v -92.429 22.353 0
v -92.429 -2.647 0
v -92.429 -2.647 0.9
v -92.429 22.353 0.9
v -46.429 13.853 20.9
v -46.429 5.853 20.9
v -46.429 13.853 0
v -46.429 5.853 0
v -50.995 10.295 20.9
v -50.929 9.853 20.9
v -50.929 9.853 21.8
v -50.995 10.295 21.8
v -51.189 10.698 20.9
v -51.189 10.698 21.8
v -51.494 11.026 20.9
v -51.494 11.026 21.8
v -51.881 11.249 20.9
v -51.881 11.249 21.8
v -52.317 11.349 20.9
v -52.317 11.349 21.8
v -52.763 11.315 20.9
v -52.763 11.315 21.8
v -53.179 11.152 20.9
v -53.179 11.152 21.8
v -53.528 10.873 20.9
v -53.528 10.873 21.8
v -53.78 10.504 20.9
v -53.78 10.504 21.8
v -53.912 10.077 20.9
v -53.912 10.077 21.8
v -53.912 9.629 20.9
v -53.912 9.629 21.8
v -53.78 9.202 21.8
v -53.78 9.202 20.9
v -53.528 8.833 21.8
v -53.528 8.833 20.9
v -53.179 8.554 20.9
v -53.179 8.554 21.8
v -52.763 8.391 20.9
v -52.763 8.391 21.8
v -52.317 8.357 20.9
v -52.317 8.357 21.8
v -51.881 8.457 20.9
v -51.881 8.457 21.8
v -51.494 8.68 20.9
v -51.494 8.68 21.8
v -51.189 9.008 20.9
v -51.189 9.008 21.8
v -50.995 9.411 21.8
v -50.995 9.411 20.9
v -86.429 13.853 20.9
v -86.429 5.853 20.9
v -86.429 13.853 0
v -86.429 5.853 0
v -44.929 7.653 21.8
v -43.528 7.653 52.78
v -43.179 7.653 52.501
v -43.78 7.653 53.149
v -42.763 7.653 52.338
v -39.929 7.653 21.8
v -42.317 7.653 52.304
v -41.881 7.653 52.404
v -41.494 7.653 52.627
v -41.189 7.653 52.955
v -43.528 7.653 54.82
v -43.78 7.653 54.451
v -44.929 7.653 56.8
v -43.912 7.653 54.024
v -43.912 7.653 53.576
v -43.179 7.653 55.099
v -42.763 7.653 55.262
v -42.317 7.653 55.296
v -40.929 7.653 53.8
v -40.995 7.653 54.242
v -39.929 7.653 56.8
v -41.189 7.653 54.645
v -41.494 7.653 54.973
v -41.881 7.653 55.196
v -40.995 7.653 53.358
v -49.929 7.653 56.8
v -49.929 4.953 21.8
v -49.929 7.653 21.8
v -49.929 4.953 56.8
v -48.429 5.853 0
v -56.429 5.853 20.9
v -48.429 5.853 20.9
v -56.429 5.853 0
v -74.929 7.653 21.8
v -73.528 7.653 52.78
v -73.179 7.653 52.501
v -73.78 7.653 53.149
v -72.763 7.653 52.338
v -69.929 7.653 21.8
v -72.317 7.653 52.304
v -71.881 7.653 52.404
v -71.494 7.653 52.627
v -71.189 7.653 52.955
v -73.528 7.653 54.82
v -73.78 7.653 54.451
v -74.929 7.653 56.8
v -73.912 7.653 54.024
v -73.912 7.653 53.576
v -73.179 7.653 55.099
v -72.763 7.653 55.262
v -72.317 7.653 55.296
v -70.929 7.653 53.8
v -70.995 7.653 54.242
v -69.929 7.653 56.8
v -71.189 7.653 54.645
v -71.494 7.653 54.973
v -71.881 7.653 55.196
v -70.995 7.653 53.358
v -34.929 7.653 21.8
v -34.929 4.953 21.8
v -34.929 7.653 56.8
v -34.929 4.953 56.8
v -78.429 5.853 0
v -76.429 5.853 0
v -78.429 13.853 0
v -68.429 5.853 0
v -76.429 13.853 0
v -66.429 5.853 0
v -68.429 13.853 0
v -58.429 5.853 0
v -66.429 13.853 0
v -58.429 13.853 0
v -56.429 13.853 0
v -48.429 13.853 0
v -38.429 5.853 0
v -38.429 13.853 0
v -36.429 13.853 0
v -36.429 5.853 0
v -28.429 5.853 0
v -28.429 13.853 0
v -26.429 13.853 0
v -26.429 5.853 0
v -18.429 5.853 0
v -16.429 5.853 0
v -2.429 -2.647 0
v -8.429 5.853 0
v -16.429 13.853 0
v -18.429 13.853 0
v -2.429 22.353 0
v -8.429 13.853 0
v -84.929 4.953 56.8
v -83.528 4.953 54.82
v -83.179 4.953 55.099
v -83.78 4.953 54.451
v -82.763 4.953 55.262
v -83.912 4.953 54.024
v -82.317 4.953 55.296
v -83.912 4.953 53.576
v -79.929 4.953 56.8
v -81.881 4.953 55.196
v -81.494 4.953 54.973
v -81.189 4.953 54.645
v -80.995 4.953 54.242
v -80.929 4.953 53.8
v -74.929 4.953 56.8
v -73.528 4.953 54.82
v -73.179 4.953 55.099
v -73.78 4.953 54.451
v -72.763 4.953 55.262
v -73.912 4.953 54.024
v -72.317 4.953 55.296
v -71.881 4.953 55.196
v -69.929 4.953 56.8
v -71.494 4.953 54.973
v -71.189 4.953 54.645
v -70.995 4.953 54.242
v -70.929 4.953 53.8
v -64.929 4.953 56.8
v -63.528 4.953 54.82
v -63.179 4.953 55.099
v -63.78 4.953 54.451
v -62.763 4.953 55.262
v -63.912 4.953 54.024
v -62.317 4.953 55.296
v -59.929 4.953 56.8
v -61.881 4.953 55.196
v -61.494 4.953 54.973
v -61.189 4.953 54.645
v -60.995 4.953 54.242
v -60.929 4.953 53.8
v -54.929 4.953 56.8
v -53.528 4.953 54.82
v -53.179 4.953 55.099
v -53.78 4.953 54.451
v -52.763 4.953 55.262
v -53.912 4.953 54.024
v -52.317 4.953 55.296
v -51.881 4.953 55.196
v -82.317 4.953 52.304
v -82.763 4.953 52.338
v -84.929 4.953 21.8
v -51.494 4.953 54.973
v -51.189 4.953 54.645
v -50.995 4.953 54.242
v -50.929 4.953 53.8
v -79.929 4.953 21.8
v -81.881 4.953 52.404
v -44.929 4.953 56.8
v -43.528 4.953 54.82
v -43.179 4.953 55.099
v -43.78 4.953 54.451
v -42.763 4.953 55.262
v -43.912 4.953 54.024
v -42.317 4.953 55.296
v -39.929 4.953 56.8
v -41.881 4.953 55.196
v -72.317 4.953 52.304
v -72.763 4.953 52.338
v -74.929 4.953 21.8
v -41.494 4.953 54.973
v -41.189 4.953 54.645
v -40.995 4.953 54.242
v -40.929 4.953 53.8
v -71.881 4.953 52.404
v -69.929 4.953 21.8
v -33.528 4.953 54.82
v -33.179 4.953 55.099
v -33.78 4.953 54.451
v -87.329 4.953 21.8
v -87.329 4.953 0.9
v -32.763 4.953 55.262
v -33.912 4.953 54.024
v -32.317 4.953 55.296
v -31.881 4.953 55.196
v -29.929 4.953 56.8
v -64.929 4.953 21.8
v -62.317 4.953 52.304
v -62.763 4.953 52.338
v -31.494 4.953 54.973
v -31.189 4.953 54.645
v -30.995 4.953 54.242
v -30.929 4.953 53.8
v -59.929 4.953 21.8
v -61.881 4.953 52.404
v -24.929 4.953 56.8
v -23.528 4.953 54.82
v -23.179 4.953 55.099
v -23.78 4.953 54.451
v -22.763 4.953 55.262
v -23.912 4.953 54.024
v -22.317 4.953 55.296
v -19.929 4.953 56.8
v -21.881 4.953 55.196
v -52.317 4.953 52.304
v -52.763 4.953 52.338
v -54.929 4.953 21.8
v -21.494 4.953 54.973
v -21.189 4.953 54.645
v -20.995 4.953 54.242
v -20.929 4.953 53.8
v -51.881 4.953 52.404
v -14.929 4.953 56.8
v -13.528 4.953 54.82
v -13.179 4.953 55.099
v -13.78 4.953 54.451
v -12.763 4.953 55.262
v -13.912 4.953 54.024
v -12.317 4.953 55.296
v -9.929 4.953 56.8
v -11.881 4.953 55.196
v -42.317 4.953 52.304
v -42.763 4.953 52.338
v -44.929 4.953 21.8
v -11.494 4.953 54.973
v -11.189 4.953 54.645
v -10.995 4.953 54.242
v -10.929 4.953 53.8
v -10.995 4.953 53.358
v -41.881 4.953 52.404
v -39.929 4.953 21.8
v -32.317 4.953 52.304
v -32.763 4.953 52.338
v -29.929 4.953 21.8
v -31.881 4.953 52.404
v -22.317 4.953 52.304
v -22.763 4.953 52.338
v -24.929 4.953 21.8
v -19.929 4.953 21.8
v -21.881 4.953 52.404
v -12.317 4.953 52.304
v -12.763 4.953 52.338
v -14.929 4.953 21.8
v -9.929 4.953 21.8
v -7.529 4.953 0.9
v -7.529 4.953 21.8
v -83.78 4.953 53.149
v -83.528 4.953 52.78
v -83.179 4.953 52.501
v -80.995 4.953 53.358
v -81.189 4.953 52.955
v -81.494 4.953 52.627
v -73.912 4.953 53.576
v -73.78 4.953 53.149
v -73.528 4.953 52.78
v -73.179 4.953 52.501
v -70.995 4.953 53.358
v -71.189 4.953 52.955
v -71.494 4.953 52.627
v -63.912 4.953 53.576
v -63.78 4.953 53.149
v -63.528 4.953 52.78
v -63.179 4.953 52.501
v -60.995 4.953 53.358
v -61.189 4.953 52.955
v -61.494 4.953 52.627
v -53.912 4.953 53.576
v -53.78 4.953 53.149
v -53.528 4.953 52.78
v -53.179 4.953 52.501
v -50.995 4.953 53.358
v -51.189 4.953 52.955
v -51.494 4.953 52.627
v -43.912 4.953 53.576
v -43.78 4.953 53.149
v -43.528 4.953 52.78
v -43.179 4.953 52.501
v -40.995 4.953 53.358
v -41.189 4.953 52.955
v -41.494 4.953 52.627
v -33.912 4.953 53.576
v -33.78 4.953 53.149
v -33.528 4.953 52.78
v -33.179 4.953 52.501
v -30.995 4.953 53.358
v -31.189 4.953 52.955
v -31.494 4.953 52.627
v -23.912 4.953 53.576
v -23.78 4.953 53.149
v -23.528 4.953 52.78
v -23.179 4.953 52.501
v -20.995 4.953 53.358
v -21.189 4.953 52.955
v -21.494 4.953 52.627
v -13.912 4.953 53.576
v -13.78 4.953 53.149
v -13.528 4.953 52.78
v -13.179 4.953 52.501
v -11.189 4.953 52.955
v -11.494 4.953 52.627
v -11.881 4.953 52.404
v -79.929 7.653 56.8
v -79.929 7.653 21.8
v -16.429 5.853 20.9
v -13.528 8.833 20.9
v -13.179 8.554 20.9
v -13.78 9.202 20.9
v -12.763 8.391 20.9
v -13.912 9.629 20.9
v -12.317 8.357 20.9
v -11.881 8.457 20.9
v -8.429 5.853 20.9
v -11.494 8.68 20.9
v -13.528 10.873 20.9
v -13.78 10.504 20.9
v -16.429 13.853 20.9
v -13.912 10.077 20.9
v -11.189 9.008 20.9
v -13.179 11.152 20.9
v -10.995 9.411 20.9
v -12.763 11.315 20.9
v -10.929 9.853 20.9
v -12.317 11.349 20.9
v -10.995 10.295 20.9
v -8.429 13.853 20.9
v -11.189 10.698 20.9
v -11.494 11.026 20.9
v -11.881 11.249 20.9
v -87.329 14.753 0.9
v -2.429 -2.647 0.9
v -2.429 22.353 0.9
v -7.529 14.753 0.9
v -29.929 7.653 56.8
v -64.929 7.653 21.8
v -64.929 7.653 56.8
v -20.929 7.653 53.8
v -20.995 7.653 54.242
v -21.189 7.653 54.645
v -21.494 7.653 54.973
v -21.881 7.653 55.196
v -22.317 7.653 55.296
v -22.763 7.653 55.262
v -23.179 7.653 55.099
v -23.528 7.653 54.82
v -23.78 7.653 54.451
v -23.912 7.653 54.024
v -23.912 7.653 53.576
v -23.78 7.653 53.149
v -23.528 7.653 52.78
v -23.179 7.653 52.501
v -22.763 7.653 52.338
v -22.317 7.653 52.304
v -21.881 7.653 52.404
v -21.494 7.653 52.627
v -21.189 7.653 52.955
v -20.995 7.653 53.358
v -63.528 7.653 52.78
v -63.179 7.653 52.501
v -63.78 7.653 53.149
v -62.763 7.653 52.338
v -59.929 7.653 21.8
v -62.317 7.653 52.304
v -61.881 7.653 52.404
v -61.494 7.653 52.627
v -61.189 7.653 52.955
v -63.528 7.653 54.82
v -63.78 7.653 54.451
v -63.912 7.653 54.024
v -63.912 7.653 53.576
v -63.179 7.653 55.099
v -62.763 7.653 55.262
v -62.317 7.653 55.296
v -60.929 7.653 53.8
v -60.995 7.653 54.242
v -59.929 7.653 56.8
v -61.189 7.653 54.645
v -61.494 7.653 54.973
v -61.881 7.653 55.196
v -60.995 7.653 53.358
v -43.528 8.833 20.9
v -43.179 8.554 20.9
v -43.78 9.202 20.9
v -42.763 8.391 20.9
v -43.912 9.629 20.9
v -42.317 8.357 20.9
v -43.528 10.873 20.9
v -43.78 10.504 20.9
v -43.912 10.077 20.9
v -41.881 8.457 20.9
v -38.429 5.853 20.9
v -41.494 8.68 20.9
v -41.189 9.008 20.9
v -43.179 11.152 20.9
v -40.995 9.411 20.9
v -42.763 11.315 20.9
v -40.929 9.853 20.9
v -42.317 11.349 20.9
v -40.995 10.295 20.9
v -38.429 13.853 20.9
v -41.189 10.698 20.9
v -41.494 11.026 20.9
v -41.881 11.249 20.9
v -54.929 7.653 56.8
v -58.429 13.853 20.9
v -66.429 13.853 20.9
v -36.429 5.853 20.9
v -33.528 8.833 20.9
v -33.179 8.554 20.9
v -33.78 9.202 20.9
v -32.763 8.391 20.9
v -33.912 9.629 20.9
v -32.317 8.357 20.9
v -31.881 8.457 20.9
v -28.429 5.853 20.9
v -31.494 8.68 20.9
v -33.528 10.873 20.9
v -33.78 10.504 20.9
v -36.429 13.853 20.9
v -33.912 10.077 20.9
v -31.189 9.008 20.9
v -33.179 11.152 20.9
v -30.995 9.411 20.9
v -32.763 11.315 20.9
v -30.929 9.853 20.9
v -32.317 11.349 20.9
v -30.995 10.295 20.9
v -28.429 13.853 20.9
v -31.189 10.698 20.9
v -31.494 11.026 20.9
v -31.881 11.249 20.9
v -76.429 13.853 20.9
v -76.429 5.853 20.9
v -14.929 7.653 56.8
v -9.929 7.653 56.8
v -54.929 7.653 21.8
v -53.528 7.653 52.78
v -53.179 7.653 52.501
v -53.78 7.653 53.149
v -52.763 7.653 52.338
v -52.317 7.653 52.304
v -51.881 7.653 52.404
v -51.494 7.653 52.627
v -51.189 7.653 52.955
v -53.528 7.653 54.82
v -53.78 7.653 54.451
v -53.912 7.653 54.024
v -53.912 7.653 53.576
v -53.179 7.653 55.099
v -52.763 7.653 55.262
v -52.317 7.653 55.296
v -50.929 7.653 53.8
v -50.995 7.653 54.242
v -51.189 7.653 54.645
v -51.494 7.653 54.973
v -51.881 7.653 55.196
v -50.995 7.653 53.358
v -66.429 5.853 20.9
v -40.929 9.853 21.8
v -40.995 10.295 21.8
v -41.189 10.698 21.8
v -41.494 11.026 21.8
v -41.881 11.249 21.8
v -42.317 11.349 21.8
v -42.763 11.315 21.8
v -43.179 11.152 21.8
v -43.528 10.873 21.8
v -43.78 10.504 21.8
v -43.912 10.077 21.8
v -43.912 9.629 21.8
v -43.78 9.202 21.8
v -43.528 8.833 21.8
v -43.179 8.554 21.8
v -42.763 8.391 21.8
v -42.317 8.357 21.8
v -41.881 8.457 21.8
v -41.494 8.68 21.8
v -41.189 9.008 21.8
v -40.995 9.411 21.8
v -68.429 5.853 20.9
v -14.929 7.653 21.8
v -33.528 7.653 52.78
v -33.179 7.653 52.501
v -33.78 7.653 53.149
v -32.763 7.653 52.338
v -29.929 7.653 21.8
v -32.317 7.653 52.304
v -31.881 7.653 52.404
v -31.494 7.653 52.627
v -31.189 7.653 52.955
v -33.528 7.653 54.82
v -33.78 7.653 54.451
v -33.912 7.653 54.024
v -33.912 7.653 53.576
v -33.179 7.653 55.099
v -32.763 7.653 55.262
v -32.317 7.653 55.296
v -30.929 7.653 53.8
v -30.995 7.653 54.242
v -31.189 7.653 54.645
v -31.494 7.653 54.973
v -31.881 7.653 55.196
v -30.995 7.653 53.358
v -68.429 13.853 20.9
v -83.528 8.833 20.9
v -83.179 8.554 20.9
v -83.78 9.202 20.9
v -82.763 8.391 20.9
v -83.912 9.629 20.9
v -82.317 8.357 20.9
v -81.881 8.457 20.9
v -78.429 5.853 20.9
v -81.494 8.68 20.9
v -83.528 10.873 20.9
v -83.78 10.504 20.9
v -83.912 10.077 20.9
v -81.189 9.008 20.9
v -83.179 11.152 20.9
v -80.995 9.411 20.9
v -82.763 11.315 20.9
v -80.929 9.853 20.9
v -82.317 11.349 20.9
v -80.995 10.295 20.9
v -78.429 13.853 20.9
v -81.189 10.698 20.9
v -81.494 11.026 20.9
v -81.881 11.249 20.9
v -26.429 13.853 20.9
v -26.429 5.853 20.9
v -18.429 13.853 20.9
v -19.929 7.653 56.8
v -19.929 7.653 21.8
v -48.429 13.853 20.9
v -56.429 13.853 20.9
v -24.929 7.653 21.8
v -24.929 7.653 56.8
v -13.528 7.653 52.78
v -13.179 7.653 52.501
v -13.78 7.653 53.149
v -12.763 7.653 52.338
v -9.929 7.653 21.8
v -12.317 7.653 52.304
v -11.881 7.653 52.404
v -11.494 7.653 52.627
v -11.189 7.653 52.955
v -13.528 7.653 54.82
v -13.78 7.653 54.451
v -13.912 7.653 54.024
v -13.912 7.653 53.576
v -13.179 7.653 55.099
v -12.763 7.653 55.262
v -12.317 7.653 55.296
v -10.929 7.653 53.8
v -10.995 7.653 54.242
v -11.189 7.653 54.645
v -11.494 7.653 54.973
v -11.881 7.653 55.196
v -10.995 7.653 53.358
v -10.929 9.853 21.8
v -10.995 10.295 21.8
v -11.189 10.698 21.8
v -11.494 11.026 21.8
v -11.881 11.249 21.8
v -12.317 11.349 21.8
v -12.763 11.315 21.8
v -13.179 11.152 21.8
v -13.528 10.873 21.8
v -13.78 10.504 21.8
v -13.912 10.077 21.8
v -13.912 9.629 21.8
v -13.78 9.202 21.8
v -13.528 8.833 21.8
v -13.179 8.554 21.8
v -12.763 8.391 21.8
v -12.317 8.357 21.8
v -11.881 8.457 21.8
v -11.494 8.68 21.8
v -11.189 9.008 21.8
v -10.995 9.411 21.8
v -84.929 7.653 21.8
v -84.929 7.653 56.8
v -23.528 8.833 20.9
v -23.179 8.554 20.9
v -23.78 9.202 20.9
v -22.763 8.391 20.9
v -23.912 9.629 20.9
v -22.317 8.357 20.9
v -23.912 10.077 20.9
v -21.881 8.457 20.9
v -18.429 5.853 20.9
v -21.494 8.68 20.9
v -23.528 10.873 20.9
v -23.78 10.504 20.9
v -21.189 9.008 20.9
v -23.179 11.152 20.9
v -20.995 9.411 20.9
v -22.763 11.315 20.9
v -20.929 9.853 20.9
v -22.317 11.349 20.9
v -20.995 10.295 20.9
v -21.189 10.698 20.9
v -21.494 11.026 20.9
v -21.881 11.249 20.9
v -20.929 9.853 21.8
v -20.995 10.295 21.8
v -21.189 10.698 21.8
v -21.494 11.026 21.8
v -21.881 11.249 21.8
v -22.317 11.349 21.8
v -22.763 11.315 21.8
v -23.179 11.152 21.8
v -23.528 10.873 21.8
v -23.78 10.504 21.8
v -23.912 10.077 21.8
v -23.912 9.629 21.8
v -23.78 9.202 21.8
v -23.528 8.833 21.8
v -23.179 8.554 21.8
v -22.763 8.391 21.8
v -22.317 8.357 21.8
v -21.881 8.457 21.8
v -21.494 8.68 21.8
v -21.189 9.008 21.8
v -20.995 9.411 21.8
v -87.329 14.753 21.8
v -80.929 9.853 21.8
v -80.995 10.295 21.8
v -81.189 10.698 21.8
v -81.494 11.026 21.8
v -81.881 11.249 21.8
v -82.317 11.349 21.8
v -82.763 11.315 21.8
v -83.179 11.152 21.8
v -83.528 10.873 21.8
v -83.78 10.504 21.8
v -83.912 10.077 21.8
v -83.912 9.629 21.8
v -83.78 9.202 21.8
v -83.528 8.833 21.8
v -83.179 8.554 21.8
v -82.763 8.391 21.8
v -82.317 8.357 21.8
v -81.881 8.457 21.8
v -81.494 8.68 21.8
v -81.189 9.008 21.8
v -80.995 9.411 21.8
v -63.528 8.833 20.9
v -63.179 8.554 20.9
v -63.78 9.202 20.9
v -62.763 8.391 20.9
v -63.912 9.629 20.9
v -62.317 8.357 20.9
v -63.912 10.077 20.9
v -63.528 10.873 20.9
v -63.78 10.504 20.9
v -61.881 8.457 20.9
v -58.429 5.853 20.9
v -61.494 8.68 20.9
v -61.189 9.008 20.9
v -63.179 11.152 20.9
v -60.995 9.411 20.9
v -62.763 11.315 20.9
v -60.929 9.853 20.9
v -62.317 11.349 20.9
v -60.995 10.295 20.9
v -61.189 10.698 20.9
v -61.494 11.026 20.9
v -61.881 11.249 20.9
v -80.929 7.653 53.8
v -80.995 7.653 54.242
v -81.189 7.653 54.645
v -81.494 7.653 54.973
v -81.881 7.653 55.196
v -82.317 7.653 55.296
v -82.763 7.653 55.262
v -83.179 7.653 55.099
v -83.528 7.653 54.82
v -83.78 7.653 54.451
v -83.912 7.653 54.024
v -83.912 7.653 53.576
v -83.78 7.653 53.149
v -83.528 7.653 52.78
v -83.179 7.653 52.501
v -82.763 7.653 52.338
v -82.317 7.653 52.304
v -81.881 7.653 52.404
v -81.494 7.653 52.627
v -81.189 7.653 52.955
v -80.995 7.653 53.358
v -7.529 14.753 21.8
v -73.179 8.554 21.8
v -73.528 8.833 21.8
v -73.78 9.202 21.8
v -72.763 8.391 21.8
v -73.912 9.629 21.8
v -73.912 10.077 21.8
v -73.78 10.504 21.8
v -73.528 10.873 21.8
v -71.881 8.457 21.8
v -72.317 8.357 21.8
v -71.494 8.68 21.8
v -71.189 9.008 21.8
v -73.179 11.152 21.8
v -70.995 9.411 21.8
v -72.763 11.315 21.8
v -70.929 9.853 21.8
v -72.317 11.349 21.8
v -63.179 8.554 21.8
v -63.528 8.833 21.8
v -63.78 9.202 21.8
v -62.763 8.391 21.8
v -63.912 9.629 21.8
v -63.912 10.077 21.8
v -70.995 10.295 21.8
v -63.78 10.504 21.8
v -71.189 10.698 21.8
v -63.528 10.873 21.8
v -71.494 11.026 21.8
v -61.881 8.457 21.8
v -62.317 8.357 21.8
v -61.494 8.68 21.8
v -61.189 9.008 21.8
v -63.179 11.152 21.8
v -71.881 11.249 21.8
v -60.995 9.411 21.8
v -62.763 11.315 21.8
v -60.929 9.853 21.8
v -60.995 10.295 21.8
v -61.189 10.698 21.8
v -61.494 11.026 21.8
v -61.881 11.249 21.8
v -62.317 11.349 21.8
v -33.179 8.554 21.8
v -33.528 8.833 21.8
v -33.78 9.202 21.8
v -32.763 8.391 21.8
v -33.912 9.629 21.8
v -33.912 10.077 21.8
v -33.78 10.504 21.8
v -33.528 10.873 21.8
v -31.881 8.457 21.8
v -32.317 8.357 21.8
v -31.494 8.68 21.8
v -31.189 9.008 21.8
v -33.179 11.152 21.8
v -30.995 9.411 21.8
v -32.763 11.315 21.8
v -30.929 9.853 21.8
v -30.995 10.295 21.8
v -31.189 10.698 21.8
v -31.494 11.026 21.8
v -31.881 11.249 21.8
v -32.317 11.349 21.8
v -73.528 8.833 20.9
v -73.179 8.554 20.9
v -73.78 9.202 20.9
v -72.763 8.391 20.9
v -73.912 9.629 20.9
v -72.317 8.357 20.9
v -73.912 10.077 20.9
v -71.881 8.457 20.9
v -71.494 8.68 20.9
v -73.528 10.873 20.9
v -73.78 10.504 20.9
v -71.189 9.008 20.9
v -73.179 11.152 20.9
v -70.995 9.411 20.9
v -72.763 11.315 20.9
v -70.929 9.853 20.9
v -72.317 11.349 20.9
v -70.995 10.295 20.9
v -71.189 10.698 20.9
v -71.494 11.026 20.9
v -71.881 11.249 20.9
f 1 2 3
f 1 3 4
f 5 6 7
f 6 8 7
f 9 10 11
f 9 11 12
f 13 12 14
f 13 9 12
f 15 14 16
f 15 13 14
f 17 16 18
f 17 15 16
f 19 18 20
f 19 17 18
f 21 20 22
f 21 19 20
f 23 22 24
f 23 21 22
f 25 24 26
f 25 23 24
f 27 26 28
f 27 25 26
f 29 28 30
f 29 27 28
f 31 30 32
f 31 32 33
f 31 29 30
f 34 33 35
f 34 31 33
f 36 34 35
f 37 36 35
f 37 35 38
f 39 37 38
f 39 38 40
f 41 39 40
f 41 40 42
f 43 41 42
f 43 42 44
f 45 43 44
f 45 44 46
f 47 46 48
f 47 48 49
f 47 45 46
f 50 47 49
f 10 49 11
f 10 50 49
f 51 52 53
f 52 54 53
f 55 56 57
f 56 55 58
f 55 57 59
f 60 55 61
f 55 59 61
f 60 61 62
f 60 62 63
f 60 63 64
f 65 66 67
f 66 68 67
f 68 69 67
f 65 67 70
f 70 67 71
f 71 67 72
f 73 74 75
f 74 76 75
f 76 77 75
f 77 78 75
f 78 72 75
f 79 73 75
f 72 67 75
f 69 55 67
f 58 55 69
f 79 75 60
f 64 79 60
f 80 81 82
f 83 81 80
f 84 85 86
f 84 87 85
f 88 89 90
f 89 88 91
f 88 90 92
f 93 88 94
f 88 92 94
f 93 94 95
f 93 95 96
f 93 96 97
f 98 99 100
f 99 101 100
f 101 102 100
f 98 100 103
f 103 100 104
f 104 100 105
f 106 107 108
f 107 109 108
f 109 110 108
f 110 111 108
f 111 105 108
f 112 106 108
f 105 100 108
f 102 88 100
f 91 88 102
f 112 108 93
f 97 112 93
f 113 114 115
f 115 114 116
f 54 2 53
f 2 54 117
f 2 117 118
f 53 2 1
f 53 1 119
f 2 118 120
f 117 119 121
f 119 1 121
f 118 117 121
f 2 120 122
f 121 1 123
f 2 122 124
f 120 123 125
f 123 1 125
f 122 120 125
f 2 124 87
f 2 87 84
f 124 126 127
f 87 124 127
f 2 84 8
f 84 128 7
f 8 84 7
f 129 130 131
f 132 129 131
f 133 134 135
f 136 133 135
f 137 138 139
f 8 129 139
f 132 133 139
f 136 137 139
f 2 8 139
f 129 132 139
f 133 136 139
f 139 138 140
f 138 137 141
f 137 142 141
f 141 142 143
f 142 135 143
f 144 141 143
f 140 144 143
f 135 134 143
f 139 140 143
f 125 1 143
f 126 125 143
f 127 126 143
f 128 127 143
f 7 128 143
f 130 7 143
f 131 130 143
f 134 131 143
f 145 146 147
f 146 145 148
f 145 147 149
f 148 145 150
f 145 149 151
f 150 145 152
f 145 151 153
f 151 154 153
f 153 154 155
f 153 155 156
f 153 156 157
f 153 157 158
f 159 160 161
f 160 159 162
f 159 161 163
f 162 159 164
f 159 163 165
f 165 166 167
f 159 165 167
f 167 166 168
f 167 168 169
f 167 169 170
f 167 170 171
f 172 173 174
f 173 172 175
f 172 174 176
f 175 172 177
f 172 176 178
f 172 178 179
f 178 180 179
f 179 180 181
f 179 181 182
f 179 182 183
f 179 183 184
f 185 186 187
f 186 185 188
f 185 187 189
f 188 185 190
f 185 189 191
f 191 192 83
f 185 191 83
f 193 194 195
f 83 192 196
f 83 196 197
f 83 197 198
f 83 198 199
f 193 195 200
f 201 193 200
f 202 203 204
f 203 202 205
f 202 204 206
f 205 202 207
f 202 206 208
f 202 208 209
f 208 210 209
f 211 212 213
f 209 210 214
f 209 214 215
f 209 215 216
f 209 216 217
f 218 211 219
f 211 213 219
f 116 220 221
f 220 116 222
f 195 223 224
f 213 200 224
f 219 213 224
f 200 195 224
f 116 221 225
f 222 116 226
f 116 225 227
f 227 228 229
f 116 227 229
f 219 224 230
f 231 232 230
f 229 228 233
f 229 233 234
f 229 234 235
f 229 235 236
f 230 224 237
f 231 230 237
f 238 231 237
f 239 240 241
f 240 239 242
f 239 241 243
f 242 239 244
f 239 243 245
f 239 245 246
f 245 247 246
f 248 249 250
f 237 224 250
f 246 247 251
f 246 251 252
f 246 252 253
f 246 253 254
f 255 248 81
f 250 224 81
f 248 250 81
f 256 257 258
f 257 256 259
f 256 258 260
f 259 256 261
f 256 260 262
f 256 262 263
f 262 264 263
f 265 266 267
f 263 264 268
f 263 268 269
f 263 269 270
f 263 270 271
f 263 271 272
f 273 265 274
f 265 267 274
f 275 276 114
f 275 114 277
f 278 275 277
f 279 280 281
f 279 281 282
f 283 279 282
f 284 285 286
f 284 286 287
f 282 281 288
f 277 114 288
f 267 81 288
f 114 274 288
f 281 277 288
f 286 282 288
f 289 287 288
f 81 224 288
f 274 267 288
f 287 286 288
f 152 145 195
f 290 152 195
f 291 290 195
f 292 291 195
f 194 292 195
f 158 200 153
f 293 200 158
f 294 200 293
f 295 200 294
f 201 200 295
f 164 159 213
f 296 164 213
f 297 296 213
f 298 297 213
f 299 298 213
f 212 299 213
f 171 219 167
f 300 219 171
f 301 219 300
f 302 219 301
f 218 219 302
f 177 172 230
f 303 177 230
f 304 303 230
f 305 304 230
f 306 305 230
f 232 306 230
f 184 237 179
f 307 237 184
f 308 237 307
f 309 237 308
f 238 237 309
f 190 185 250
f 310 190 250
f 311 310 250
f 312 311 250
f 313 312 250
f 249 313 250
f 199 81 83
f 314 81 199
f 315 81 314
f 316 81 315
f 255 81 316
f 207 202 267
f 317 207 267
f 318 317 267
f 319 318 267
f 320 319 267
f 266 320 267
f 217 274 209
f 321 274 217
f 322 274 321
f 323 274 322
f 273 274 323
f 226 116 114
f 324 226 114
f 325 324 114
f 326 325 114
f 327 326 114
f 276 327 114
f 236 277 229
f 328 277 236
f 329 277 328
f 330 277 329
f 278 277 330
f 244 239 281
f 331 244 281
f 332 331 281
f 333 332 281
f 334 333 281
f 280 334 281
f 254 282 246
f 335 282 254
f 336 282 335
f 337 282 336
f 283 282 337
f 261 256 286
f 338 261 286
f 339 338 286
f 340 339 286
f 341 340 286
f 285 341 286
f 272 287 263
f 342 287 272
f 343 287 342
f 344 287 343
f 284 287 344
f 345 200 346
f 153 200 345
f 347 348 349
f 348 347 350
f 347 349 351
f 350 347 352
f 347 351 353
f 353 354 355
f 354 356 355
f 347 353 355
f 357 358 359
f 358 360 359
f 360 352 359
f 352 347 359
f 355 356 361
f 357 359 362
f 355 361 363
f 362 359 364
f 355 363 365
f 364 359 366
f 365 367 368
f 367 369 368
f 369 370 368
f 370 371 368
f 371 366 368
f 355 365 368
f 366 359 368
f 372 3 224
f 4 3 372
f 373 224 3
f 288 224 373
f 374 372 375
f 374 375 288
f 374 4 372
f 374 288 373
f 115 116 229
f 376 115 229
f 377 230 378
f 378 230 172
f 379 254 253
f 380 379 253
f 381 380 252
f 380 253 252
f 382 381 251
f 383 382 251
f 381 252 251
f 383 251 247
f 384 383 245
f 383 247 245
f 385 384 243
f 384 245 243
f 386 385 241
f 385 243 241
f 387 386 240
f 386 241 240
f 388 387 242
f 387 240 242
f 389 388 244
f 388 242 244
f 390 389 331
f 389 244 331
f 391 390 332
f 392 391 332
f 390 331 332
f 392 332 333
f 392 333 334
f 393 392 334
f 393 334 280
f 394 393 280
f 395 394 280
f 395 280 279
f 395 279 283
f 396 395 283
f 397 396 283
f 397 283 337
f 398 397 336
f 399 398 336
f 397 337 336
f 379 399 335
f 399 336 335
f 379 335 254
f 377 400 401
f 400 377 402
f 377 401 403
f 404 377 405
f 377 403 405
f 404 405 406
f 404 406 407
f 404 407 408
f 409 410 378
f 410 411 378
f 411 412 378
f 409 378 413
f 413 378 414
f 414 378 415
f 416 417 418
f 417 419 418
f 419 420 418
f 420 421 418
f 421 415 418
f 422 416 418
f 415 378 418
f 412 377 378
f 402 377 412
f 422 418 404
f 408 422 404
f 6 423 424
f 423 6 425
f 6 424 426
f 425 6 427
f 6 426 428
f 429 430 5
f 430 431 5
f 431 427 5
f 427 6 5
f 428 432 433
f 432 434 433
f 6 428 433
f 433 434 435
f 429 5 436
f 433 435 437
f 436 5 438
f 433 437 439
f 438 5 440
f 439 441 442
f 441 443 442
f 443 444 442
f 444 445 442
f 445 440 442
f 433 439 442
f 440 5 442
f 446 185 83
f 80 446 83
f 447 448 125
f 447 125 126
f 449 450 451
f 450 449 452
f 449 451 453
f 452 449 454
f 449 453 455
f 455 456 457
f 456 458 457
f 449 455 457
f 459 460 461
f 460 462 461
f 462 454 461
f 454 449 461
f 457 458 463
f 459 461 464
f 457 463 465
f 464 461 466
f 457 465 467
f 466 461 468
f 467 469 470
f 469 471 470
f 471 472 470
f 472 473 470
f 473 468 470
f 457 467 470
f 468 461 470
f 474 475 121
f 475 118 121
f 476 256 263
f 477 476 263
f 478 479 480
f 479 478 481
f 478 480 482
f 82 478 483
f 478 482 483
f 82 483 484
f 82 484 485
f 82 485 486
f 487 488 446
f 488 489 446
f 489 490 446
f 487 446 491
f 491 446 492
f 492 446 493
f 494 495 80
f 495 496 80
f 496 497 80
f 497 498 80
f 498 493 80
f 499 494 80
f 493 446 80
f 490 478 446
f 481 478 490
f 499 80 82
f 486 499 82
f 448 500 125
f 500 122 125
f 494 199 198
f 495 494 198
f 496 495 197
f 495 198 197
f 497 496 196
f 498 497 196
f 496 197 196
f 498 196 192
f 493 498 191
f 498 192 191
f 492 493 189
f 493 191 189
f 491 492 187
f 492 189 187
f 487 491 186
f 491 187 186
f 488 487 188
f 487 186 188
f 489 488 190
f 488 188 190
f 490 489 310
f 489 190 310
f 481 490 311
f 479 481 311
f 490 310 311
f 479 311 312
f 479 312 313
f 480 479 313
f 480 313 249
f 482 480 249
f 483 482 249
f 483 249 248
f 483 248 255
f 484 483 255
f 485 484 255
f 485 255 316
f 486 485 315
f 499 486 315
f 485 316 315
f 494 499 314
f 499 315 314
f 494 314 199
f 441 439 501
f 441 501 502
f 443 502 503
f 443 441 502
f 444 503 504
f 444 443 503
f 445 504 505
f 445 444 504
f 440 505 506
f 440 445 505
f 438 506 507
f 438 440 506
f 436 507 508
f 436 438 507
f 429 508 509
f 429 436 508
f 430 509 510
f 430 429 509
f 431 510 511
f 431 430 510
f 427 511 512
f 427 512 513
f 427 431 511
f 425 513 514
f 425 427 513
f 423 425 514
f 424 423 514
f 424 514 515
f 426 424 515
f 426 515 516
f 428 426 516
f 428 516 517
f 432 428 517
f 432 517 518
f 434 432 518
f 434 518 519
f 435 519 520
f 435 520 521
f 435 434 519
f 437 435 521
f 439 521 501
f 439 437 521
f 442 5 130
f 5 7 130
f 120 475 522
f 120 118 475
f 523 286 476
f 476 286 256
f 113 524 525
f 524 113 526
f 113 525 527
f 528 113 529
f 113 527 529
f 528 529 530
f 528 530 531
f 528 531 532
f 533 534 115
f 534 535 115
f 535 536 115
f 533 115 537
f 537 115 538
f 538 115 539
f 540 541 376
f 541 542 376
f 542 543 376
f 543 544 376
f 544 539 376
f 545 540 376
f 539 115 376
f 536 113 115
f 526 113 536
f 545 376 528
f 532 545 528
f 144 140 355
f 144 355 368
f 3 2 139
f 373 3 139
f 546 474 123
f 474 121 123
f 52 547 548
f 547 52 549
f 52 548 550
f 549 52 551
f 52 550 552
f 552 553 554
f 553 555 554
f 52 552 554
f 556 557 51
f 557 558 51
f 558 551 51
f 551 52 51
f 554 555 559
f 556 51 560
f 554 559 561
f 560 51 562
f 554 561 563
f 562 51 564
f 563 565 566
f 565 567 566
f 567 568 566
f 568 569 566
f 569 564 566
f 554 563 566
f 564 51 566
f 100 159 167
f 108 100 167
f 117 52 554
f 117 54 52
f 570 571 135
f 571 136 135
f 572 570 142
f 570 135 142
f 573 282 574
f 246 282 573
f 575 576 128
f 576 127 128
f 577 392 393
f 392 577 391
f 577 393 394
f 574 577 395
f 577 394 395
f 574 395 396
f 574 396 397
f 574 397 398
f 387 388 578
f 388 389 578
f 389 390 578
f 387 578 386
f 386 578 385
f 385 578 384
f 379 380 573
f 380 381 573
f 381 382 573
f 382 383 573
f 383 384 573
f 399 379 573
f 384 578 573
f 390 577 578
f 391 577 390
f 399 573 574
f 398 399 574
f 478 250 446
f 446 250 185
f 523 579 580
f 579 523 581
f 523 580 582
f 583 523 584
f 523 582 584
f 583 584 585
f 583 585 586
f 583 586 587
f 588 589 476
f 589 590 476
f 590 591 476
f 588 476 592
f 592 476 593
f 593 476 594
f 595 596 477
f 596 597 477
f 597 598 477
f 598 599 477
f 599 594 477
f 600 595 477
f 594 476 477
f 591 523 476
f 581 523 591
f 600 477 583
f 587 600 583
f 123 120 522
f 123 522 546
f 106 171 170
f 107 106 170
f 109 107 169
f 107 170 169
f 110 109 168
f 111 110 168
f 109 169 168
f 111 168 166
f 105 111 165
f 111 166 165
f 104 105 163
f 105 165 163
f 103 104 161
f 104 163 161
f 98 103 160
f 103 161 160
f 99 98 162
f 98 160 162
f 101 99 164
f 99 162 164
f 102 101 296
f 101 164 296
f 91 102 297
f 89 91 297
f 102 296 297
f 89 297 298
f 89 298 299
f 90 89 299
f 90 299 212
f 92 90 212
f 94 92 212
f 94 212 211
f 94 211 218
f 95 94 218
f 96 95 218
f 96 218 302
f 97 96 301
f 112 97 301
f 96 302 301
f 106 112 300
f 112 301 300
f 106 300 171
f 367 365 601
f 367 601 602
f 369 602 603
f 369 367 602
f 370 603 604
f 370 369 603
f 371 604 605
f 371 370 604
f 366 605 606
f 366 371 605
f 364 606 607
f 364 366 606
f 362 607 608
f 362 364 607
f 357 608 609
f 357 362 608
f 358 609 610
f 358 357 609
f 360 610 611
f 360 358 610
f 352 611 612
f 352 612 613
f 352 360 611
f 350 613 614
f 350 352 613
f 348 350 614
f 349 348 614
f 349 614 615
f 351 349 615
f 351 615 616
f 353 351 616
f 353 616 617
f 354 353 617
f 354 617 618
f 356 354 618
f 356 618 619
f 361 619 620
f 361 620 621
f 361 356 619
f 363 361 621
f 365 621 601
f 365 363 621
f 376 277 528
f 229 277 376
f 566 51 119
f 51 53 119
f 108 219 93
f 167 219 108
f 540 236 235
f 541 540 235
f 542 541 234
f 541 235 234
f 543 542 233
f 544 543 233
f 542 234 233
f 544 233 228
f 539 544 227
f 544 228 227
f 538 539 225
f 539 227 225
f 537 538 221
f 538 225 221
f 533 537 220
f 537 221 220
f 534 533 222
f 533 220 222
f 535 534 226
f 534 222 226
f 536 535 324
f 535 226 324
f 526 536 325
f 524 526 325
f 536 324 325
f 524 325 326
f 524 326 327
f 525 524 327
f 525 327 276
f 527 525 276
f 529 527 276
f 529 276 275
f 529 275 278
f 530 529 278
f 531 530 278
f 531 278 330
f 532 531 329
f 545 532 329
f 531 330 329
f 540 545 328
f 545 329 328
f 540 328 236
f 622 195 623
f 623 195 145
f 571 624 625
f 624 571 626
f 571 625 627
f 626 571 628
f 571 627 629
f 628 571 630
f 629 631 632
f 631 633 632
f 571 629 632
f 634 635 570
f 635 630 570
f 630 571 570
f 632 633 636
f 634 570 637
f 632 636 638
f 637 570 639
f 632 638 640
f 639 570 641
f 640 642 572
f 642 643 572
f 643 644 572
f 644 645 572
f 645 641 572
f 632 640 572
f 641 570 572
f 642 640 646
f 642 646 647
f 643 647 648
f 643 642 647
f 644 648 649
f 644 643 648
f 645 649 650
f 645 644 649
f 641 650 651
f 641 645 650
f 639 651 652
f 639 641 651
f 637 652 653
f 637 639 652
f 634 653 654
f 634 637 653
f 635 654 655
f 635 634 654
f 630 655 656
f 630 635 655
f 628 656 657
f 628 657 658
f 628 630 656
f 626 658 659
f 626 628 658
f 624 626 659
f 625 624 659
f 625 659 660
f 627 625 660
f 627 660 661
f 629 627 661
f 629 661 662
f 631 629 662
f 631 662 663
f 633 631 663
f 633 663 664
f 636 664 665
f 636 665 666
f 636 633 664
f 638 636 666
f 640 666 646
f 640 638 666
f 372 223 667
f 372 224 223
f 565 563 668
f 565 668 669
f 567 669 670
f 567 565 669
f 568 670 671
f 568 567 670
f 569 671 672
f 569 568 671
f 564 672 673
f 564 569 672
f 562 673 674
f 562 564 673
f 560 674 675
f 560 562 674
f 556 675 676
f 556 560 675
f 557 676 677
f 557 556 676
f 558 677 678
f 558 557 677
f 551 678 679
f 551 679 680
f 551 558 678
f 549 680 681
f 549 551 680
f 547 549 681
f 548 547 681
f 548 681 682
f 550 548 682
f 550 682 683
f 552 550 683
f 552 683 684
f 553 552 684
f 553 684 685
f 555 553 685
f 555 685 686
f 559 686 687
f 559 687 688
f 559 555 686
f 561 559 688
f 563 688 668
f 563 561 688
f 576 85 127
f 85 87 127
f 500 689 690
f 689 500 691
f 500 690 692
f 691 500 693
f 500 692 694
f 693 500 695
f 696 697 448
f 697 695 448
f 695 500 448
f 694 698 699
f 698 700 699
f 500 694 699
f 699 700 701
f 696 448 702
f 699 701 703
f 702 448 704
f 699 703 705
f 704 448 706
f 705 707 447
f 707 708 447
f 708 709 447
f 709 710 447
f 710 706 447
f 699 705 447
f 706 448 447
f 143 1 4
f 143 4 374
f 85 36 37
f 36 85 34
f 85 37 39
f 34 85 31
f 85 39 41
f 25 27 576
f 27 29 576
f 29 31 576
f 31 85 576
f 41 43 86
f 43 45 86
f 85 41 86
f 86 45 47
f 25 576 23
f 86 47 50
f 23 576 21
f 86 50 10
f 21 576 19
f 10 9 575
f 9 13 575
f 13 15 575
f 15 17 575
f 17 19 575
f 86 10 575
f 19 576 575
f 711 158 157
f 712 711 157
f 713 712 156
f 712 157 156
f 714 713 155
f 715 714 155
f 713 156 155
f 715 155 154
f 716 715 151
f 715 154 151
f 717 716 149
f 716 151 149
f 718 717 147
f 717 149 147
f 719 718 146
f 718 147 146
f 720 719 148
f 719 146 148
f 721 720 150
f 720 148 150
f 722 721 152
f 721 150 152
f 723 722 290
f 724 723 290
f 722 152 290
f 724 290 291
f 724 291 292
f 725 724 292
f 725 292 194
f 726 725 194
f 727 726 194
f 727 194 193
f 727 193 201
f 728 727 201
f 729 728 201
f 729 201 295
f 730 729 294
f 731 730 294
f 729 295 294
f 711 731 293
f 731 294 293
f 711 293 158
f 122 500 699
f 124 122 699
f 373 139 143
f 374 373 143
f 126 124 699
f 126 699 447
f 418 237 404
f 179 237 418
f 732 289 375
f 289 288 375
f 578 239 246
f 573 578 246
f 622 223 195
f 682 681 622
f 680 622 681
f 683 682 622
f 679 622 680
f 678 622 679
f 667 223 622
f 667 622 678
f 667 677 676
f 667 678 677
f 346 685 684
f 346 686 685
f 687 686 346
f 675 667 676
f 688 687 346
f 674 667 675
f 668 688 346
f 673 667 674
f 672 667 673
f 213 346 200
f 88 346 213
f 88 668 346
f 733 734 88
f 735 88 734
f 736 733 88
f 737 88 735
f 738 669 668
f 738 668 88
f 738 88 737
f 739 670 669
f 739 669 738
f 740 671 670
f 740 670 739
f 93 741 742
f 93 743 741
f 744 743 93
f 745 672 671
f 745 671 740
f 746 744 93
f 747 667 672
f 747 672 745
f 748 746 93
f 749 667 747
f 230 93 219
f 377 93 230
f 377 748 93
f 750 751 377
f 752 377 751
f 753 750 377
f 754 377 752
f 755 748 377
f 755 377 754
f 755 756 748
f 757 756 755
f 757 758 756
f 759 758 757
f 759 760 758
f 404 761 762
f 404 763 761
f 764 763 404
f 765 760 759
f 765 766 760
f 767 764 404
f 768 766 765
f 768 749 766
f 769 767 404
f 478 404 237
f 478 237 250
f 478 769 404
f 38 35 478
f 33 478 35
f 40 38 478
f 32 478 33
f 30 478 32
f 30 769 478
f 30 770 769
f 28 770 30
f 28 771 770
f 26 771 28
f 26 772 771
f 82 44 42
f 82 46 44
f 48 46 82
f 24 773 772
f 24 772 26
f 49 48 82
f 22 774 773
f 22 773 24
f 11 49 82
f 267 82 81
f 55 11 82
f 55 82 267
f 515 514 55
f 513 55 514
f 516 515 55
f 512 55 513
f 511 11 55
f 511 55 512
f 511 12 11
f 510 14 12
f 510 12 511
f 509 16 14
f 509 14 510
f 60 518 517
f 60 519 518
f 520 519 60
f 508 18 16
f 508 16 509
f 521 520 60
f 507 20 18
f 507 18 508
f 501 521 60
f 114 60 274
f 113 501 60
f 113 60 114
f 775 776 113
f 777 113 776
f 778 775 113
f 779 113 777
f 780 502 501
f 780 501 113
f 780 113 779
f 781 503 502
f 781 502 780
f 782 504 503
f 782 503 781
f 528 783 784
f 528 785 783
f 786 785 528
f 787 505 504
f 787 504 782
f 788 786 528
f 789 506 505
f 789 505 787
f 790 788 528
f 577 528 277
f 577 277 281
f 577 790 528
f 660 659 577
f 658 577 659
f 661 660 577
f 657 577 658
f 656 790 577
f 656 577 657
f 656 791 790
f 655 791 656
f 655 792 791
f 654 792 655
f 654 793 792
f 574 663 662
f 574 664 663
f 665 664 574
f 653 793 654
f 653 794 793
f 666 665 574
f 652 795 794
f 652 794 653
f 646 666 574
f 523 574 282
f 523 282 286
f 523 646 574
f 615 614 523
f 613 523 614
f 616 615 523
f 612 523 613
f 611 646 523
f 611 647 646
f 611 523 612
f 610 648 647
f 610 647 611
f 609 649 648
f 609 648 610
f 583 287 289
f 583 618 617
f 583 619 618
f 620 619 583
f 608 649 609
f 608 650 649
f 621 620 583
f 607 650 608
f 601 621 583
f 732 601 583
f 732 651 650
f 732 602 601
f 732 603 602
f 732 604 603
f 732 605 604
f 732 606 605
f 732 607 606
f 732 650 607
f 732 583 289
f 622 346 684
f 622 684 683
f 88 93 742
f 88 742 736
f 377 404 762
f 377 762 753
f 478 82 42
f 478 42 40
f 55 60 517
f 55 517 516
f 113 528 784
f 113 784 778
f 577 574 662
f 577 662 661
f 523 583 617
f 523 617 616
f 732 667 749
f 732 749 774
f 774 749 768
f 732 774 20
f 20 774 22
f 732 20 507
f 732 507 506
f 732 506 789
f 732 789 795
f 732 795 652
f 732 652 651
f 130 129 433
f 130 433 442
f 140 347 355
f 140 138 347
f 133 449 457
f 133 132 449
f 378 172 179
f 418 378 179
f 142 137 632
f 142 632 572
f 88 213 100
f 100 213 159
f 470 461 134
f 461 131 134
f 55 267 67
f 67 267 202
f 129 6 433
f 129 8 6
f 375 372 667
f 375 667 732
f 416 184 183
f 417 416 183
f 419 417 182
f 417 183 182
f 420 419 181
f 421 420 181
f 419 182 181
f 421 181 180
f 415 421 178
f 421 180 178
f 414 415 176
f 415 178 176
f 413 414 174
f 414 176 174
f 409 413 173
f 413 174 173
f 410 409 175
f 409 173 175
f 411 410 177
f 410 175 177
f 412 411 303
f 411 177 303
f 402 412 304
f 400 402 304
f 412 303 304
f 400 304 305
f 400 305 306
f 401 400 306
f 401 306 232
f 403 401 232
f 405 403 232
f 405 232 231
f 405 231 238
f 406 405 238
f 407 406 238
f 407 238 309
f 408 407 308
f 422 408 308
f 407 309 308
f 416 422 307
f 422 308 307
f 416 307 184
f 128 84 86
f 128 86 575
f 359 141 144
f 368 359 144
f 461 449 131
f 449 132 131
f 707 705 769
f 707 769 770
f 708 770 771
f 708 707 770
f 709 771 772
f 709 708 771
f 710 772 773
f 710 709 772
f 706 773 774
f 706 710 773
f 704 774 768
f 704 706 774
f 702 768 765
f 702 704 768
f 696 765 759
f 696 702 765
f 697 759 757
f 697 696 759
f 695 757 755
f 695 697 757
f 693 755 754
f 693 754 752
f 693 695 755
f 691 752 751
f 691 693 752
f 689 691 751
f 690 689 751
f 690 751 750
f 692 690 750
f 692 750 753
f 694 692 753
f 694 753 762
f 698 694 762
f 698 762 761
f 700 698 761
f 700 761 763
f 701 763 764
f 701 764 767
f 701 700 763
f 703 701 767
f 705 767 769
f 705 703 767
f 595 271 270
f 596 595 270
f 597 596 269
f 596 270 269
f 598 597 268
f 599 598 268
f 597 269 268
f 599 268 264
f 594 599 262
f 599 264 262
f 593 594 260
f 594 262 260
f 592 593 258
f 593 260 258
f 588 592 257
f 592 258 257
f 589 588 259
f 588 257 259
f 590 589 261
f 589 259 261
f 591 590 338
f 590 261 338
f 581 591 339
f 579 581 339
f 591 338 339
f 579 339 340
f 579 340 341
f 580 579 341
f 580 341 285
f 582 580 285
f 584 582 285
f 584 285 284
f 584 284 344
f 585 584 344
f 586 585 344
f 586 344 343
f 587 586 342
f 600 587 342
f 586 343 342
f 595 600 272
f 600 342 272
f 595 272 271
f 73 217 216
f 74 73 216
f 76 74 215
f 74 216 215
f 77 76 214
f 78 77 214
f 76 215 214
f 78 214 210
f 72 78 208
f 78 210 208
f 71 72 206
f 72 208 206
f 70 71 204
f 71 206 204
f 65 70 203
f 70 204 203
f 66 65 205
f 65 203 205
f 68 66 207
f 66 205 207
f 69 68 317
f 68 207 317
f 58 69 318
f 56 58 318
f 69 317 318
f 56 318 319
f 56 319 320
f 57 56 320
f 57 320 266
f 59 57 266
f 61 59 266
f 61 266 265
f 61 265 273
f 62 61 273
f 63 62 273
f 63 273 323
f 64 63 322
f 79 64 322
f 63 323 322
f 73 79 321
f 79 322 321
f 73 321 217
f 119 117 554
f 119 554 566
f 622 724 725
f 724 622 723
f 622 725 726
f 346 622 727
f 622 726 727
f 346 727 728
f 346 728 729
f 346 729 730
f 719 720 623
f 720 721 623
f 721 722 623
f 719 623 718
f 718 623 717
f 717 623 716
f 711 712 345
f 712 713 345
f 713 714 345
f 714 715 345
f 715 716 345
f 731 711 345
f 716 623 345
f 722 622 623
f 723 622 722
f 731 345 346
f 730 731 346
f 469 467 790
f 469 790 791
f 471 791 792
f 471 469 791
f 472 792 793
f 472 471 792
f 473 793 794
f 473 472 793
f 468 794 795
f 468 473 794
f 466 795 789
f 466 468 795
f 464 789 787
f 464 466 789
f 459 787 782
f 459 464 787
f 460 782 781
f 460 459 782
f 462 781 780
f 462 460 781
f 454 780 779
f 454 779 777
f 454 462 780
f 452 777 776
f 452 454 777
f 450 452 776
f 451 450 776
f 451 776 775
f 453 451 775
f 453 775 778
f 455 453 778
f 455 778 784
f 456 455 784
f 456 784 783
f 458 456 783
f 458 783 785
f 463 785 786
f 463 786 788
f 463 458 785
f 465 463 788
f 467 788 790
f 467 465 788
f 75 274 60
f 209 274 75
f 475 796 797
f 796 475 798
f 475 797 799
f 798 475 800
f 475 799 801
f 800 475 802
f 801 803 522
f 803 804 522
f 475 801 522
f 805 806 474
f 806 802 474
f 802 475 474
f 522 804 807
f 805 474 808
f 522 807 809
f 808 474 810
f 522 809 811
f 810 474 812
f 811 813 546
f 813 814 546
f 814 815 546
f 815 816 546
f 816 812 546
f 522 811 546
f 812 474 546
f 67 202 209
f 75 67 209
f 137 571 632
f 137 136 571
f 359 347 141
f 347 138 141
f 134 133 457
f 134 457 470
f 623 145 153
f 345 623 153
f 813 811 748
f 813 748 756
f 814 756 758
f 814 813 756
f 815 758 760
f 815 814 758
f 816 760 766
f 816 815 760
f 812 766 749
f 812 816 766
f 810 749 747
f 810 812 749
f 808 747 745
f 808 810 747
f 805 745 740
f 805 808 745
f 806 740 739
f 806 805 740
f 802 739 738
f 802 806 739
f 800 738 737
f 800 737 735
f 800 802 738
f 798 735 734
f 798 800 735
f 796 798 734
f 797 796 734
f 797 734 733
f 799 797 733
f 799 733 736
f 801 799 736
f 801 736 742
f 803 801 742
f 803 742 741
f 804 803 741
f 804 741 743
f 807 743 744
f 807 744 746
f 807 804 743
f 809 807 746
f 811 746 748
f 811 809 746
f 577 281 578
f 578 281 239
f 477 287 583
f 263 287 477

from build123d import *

# Parameters (mm, degrees)
CROQUIS1_W              = 90
CROQUIS1_H              = 25
SALIENTE_EXTRUIR1_DEPTH = 0.9
CROQUIS2_W              = 8
CROQUIS2_H              = 8
CORTAR_EXTRUIR1_DEPTH   = 0.9
CROQUIS3_W              = 79.8
CROQUIS3_H              = 9.8
CROQUIS3_W_2            = 8
CROQUIS3_H_2            = 8
SALIENTE_EXTRUIR2_DEPTH = 20
CROQUIS4_W              = 79.8
CROQUIS4_H              = 9.8
CROQUIS4_R              = 1.5
SALIENTE_EXTRUIR3_DEPTH = 0.9
CROQUIS5_W              = 5
CROQUIS5_H              = 35
CROQUIS5_R              = 1.5
SALIENTE_EXTRUIR4_DEPTH = 2.7


with BuildPart() as part:
    # Croquis1 → Saliente-Extruir1 (new body)
    with BuildSketch(Plane.XY):
        with Locations((-47.428766378, 9.852941176)):
            Rectangle(CROQUIS1_W, CROQUIS1_H)
    extrude(amount=SALIENTE_EXTRUIR1_DEPTH)

    # Croquis2 → Cortar-Extruir1 (cut)
    with BuildSketch(Plane.XY.offset(0.9)):
        with Locations((-82.428766378, 9.852941176)):
            Rectangle(CROQUIS2_W, CROQUIS2_H)
        with Locations((-72.428766378, 9.852941176)):
            Rectangle(CROQUIS2_W, CROQUIS2_H)
        with Locations((-62.428766378, 9.852941176)):
            Rectangle(CROQUIS2_W, CROQUIS2_H)
        with Locations((-52.428766378, 9.852941176)):
            Rectangle(CROQUIS2_W, CROQUIS2_H)
        with Locations((-42.428766378, 9.852941176)):
            Rectangle(CROQUIS2_W, CROQUIS2_H)
        with Locations((-32.428766378, 9.852941176)):
            Rectangle(CROQUIS2_W, CROQUIS2_H)
        with Locations((-22.428766378, 9.852941176)):
            Rectangle(CROQUIS2_W, CROQUIS2_H)
        with Locations((-12.428766378, 9.852941176)):
            Rectangle(CROQUIS2_W, CROQUIS2_H)
    extrude(amount=-CORTAR_EXTRUIR1_DEPTH, mode=Mode.SUBTRACT)

    # Croquis3 → Saliente-Extruir2 (add)
    with BuildSketch(Plane.XY.offset(0.9)):
        with Locations((-47.428766378, 9.852941176)):
            Rectangle(CROQUIS3_W, CROQUIS3_H)
        with Locations((-72.428766378, 9.852941176)):
            Rectangle(CROQUIS3_W_2, CROQUIS3_H_2, mode=Mode.SUBTRACT)
        with Locations((-82.428766378, 9.852941176)):
            Rectangle(CROQUIS3_W_2, CROQUIS3_H_2, mode=Mode.SUBTRACT)
        with Locations((-62.428766378, 9.852941176)):
            Rectangle(CROQUIS3_W_2, CROQUIS3_H_2, mode=Mode.SUBTRACT)
        with Locations((-52.428766378, 9.852941176)):
            Rectangle(CROQUIS3_W_2, CROQUIS3_H_2, mode=Mode.SUBTRACT)
        with Locations((-42.428766378, 9.852941176)):
            Rectangle(CROQUIS3_W_2, CROQUIS3_H_2, mode=Mode.SUBTRACT)
        with Locations((-32.428766378, 9.852941176)):
            Rectangle(CROQUIS3_W_2, CROQUIS3_H_2, mode=Mode.SUBTRACT)
        with Locations((-22.428766378, 9.852941176)):
            Rectangle(CROQUIS3_W_2, CROQUIS3_H_2, mode=Mode.SUBTRACT)
        with Locations((-12.428766378, 9.852941176)):
            Rectangle(CROQUIS3_W_2, CROQUIS3_H_2, mode=Mode.SUBTRACT)
    extrude(amount=SALIENTE_EXTRUIR2_DEPTH)

    # Croquis4 → Saliente-Extruir3 (add)
    with BuildSketch(Plane.XY.offset(20.9)):
        with Locations((-47.428766378, 9.852941176)):
            Rectangle(CROQUIS4_W, CROQUIS4_H)
        with Locations((-82.428766378, 9.852941176)):
            Circle(CROQUIS4_R, mode=Mode.SUBTRACT)
        with Locations((-72.428766378, 9.852941176)):
            Circle(CROQUIS4_R, mode=Mode.SUBTRACT)
        with Locations((-62.428766378, 9.852941176)):
            Circle(CROQUIS4_R, mode=Mode.SUBTRACT)
        with Locations((-52.428766378, 9.852941176)):
            Circle(CROQUIS4_R, mode=Mode.SUBTRACT)
        with Locations((-42.428766378, 9.852941176)):
            Circle(CROQUIS4_R, mode=Mode.SUBTRACT)
        with Locations((-32.428766378, 9.852941176)):
            Circle(CROQUIS4_R, mode=Mode.SUBTRACT)
        with Locations((-22.428766378, 9.852941176)):
            Circle(CROQUIS4_R, mode=Mode.SUBTRACT)
        with Locations((-12.428766378, 9.852941176)):
            Circle(CROQUIS4_R, mode=Mode.SUBTRACT)
    extrude(amount=SALIENTE_EXTRUIR3_DEPTH)

    # Croquis5 → Saliente-Extruir4 (add)
    with BuildSketch(Plane.XZ.offset(-4.952941176)):
        with Locations((-82.428766378, 39.3)):
            Rectangle(CROQUIS5_W, CROQUIS5_H)
        with Locations((-82.428766378, 53.8)):
            Circle(CROQUIS5_R, mode=Mode.SUBTRACT)
        with Locations((-72.428766378, 39.3)):
            Rectangle(CROQUIS5_W, CROQUIS5_H)
        with Locations((-72.428766378, 53.8)):
            Circle(CROQUIS5_R, mode=Mode.SUBTRACT)
        with Locations((-62.428766378, 39.3)):
            Rectangle(CROQUIS5_W, CROQUIS5_H)
        with Locations((-62.428766378, 53.8)):
            Circle(CROQUIS5_R, mode=Mode.SUBTRACT)
        with Locations((-52.428766378, 39.3)):
            Rectangle(CROQUIS5_W, CROQUIS5_H)
        with Locations((-52.428766378, 53.8)):
            Circle(CROQUIS5_R, mode=Mode.SUBTRACT)
        with Locations((-42.428766378, 39.3)):
            Rectangle(CROQUIS5_W, CROQUIS5_H)
        with Locations((-42.428766378, 53.8)):
            Circle(CROQUIS5_R, mode=Mode.SUBTRACT)
        with Locations((-32.428766378, 39.3)):
            Rectangle(CROQUIS5_W, CROQUIS5_H)
        with Locations((-32.428766378, 53.8)):
            Circle(CROQUIS5_R, mode=Mode.SUBTRACT)
        with Locations((-22.428766378, 39.3)):
            Rectangle(CROQUIS5_W, CROQUIS5_H)
        with Locations((-22.428766378, 53.8)):
            Circle(CROQUIS5_R, mode=Mode.SUBTRACT)
        with Locations((-12.428766378, 39.3)):
            Rectangle(CROQUIS5_W, CROQUIS5_H)
        with Locations((-12.428766378, 53.8)):
            Circle(CROQUIS5_R, mode=Mode.SUBTRACT)
    extrude(amount=-SALIENTE_EXTRUIR4_DEPTH)


solid = part.part
